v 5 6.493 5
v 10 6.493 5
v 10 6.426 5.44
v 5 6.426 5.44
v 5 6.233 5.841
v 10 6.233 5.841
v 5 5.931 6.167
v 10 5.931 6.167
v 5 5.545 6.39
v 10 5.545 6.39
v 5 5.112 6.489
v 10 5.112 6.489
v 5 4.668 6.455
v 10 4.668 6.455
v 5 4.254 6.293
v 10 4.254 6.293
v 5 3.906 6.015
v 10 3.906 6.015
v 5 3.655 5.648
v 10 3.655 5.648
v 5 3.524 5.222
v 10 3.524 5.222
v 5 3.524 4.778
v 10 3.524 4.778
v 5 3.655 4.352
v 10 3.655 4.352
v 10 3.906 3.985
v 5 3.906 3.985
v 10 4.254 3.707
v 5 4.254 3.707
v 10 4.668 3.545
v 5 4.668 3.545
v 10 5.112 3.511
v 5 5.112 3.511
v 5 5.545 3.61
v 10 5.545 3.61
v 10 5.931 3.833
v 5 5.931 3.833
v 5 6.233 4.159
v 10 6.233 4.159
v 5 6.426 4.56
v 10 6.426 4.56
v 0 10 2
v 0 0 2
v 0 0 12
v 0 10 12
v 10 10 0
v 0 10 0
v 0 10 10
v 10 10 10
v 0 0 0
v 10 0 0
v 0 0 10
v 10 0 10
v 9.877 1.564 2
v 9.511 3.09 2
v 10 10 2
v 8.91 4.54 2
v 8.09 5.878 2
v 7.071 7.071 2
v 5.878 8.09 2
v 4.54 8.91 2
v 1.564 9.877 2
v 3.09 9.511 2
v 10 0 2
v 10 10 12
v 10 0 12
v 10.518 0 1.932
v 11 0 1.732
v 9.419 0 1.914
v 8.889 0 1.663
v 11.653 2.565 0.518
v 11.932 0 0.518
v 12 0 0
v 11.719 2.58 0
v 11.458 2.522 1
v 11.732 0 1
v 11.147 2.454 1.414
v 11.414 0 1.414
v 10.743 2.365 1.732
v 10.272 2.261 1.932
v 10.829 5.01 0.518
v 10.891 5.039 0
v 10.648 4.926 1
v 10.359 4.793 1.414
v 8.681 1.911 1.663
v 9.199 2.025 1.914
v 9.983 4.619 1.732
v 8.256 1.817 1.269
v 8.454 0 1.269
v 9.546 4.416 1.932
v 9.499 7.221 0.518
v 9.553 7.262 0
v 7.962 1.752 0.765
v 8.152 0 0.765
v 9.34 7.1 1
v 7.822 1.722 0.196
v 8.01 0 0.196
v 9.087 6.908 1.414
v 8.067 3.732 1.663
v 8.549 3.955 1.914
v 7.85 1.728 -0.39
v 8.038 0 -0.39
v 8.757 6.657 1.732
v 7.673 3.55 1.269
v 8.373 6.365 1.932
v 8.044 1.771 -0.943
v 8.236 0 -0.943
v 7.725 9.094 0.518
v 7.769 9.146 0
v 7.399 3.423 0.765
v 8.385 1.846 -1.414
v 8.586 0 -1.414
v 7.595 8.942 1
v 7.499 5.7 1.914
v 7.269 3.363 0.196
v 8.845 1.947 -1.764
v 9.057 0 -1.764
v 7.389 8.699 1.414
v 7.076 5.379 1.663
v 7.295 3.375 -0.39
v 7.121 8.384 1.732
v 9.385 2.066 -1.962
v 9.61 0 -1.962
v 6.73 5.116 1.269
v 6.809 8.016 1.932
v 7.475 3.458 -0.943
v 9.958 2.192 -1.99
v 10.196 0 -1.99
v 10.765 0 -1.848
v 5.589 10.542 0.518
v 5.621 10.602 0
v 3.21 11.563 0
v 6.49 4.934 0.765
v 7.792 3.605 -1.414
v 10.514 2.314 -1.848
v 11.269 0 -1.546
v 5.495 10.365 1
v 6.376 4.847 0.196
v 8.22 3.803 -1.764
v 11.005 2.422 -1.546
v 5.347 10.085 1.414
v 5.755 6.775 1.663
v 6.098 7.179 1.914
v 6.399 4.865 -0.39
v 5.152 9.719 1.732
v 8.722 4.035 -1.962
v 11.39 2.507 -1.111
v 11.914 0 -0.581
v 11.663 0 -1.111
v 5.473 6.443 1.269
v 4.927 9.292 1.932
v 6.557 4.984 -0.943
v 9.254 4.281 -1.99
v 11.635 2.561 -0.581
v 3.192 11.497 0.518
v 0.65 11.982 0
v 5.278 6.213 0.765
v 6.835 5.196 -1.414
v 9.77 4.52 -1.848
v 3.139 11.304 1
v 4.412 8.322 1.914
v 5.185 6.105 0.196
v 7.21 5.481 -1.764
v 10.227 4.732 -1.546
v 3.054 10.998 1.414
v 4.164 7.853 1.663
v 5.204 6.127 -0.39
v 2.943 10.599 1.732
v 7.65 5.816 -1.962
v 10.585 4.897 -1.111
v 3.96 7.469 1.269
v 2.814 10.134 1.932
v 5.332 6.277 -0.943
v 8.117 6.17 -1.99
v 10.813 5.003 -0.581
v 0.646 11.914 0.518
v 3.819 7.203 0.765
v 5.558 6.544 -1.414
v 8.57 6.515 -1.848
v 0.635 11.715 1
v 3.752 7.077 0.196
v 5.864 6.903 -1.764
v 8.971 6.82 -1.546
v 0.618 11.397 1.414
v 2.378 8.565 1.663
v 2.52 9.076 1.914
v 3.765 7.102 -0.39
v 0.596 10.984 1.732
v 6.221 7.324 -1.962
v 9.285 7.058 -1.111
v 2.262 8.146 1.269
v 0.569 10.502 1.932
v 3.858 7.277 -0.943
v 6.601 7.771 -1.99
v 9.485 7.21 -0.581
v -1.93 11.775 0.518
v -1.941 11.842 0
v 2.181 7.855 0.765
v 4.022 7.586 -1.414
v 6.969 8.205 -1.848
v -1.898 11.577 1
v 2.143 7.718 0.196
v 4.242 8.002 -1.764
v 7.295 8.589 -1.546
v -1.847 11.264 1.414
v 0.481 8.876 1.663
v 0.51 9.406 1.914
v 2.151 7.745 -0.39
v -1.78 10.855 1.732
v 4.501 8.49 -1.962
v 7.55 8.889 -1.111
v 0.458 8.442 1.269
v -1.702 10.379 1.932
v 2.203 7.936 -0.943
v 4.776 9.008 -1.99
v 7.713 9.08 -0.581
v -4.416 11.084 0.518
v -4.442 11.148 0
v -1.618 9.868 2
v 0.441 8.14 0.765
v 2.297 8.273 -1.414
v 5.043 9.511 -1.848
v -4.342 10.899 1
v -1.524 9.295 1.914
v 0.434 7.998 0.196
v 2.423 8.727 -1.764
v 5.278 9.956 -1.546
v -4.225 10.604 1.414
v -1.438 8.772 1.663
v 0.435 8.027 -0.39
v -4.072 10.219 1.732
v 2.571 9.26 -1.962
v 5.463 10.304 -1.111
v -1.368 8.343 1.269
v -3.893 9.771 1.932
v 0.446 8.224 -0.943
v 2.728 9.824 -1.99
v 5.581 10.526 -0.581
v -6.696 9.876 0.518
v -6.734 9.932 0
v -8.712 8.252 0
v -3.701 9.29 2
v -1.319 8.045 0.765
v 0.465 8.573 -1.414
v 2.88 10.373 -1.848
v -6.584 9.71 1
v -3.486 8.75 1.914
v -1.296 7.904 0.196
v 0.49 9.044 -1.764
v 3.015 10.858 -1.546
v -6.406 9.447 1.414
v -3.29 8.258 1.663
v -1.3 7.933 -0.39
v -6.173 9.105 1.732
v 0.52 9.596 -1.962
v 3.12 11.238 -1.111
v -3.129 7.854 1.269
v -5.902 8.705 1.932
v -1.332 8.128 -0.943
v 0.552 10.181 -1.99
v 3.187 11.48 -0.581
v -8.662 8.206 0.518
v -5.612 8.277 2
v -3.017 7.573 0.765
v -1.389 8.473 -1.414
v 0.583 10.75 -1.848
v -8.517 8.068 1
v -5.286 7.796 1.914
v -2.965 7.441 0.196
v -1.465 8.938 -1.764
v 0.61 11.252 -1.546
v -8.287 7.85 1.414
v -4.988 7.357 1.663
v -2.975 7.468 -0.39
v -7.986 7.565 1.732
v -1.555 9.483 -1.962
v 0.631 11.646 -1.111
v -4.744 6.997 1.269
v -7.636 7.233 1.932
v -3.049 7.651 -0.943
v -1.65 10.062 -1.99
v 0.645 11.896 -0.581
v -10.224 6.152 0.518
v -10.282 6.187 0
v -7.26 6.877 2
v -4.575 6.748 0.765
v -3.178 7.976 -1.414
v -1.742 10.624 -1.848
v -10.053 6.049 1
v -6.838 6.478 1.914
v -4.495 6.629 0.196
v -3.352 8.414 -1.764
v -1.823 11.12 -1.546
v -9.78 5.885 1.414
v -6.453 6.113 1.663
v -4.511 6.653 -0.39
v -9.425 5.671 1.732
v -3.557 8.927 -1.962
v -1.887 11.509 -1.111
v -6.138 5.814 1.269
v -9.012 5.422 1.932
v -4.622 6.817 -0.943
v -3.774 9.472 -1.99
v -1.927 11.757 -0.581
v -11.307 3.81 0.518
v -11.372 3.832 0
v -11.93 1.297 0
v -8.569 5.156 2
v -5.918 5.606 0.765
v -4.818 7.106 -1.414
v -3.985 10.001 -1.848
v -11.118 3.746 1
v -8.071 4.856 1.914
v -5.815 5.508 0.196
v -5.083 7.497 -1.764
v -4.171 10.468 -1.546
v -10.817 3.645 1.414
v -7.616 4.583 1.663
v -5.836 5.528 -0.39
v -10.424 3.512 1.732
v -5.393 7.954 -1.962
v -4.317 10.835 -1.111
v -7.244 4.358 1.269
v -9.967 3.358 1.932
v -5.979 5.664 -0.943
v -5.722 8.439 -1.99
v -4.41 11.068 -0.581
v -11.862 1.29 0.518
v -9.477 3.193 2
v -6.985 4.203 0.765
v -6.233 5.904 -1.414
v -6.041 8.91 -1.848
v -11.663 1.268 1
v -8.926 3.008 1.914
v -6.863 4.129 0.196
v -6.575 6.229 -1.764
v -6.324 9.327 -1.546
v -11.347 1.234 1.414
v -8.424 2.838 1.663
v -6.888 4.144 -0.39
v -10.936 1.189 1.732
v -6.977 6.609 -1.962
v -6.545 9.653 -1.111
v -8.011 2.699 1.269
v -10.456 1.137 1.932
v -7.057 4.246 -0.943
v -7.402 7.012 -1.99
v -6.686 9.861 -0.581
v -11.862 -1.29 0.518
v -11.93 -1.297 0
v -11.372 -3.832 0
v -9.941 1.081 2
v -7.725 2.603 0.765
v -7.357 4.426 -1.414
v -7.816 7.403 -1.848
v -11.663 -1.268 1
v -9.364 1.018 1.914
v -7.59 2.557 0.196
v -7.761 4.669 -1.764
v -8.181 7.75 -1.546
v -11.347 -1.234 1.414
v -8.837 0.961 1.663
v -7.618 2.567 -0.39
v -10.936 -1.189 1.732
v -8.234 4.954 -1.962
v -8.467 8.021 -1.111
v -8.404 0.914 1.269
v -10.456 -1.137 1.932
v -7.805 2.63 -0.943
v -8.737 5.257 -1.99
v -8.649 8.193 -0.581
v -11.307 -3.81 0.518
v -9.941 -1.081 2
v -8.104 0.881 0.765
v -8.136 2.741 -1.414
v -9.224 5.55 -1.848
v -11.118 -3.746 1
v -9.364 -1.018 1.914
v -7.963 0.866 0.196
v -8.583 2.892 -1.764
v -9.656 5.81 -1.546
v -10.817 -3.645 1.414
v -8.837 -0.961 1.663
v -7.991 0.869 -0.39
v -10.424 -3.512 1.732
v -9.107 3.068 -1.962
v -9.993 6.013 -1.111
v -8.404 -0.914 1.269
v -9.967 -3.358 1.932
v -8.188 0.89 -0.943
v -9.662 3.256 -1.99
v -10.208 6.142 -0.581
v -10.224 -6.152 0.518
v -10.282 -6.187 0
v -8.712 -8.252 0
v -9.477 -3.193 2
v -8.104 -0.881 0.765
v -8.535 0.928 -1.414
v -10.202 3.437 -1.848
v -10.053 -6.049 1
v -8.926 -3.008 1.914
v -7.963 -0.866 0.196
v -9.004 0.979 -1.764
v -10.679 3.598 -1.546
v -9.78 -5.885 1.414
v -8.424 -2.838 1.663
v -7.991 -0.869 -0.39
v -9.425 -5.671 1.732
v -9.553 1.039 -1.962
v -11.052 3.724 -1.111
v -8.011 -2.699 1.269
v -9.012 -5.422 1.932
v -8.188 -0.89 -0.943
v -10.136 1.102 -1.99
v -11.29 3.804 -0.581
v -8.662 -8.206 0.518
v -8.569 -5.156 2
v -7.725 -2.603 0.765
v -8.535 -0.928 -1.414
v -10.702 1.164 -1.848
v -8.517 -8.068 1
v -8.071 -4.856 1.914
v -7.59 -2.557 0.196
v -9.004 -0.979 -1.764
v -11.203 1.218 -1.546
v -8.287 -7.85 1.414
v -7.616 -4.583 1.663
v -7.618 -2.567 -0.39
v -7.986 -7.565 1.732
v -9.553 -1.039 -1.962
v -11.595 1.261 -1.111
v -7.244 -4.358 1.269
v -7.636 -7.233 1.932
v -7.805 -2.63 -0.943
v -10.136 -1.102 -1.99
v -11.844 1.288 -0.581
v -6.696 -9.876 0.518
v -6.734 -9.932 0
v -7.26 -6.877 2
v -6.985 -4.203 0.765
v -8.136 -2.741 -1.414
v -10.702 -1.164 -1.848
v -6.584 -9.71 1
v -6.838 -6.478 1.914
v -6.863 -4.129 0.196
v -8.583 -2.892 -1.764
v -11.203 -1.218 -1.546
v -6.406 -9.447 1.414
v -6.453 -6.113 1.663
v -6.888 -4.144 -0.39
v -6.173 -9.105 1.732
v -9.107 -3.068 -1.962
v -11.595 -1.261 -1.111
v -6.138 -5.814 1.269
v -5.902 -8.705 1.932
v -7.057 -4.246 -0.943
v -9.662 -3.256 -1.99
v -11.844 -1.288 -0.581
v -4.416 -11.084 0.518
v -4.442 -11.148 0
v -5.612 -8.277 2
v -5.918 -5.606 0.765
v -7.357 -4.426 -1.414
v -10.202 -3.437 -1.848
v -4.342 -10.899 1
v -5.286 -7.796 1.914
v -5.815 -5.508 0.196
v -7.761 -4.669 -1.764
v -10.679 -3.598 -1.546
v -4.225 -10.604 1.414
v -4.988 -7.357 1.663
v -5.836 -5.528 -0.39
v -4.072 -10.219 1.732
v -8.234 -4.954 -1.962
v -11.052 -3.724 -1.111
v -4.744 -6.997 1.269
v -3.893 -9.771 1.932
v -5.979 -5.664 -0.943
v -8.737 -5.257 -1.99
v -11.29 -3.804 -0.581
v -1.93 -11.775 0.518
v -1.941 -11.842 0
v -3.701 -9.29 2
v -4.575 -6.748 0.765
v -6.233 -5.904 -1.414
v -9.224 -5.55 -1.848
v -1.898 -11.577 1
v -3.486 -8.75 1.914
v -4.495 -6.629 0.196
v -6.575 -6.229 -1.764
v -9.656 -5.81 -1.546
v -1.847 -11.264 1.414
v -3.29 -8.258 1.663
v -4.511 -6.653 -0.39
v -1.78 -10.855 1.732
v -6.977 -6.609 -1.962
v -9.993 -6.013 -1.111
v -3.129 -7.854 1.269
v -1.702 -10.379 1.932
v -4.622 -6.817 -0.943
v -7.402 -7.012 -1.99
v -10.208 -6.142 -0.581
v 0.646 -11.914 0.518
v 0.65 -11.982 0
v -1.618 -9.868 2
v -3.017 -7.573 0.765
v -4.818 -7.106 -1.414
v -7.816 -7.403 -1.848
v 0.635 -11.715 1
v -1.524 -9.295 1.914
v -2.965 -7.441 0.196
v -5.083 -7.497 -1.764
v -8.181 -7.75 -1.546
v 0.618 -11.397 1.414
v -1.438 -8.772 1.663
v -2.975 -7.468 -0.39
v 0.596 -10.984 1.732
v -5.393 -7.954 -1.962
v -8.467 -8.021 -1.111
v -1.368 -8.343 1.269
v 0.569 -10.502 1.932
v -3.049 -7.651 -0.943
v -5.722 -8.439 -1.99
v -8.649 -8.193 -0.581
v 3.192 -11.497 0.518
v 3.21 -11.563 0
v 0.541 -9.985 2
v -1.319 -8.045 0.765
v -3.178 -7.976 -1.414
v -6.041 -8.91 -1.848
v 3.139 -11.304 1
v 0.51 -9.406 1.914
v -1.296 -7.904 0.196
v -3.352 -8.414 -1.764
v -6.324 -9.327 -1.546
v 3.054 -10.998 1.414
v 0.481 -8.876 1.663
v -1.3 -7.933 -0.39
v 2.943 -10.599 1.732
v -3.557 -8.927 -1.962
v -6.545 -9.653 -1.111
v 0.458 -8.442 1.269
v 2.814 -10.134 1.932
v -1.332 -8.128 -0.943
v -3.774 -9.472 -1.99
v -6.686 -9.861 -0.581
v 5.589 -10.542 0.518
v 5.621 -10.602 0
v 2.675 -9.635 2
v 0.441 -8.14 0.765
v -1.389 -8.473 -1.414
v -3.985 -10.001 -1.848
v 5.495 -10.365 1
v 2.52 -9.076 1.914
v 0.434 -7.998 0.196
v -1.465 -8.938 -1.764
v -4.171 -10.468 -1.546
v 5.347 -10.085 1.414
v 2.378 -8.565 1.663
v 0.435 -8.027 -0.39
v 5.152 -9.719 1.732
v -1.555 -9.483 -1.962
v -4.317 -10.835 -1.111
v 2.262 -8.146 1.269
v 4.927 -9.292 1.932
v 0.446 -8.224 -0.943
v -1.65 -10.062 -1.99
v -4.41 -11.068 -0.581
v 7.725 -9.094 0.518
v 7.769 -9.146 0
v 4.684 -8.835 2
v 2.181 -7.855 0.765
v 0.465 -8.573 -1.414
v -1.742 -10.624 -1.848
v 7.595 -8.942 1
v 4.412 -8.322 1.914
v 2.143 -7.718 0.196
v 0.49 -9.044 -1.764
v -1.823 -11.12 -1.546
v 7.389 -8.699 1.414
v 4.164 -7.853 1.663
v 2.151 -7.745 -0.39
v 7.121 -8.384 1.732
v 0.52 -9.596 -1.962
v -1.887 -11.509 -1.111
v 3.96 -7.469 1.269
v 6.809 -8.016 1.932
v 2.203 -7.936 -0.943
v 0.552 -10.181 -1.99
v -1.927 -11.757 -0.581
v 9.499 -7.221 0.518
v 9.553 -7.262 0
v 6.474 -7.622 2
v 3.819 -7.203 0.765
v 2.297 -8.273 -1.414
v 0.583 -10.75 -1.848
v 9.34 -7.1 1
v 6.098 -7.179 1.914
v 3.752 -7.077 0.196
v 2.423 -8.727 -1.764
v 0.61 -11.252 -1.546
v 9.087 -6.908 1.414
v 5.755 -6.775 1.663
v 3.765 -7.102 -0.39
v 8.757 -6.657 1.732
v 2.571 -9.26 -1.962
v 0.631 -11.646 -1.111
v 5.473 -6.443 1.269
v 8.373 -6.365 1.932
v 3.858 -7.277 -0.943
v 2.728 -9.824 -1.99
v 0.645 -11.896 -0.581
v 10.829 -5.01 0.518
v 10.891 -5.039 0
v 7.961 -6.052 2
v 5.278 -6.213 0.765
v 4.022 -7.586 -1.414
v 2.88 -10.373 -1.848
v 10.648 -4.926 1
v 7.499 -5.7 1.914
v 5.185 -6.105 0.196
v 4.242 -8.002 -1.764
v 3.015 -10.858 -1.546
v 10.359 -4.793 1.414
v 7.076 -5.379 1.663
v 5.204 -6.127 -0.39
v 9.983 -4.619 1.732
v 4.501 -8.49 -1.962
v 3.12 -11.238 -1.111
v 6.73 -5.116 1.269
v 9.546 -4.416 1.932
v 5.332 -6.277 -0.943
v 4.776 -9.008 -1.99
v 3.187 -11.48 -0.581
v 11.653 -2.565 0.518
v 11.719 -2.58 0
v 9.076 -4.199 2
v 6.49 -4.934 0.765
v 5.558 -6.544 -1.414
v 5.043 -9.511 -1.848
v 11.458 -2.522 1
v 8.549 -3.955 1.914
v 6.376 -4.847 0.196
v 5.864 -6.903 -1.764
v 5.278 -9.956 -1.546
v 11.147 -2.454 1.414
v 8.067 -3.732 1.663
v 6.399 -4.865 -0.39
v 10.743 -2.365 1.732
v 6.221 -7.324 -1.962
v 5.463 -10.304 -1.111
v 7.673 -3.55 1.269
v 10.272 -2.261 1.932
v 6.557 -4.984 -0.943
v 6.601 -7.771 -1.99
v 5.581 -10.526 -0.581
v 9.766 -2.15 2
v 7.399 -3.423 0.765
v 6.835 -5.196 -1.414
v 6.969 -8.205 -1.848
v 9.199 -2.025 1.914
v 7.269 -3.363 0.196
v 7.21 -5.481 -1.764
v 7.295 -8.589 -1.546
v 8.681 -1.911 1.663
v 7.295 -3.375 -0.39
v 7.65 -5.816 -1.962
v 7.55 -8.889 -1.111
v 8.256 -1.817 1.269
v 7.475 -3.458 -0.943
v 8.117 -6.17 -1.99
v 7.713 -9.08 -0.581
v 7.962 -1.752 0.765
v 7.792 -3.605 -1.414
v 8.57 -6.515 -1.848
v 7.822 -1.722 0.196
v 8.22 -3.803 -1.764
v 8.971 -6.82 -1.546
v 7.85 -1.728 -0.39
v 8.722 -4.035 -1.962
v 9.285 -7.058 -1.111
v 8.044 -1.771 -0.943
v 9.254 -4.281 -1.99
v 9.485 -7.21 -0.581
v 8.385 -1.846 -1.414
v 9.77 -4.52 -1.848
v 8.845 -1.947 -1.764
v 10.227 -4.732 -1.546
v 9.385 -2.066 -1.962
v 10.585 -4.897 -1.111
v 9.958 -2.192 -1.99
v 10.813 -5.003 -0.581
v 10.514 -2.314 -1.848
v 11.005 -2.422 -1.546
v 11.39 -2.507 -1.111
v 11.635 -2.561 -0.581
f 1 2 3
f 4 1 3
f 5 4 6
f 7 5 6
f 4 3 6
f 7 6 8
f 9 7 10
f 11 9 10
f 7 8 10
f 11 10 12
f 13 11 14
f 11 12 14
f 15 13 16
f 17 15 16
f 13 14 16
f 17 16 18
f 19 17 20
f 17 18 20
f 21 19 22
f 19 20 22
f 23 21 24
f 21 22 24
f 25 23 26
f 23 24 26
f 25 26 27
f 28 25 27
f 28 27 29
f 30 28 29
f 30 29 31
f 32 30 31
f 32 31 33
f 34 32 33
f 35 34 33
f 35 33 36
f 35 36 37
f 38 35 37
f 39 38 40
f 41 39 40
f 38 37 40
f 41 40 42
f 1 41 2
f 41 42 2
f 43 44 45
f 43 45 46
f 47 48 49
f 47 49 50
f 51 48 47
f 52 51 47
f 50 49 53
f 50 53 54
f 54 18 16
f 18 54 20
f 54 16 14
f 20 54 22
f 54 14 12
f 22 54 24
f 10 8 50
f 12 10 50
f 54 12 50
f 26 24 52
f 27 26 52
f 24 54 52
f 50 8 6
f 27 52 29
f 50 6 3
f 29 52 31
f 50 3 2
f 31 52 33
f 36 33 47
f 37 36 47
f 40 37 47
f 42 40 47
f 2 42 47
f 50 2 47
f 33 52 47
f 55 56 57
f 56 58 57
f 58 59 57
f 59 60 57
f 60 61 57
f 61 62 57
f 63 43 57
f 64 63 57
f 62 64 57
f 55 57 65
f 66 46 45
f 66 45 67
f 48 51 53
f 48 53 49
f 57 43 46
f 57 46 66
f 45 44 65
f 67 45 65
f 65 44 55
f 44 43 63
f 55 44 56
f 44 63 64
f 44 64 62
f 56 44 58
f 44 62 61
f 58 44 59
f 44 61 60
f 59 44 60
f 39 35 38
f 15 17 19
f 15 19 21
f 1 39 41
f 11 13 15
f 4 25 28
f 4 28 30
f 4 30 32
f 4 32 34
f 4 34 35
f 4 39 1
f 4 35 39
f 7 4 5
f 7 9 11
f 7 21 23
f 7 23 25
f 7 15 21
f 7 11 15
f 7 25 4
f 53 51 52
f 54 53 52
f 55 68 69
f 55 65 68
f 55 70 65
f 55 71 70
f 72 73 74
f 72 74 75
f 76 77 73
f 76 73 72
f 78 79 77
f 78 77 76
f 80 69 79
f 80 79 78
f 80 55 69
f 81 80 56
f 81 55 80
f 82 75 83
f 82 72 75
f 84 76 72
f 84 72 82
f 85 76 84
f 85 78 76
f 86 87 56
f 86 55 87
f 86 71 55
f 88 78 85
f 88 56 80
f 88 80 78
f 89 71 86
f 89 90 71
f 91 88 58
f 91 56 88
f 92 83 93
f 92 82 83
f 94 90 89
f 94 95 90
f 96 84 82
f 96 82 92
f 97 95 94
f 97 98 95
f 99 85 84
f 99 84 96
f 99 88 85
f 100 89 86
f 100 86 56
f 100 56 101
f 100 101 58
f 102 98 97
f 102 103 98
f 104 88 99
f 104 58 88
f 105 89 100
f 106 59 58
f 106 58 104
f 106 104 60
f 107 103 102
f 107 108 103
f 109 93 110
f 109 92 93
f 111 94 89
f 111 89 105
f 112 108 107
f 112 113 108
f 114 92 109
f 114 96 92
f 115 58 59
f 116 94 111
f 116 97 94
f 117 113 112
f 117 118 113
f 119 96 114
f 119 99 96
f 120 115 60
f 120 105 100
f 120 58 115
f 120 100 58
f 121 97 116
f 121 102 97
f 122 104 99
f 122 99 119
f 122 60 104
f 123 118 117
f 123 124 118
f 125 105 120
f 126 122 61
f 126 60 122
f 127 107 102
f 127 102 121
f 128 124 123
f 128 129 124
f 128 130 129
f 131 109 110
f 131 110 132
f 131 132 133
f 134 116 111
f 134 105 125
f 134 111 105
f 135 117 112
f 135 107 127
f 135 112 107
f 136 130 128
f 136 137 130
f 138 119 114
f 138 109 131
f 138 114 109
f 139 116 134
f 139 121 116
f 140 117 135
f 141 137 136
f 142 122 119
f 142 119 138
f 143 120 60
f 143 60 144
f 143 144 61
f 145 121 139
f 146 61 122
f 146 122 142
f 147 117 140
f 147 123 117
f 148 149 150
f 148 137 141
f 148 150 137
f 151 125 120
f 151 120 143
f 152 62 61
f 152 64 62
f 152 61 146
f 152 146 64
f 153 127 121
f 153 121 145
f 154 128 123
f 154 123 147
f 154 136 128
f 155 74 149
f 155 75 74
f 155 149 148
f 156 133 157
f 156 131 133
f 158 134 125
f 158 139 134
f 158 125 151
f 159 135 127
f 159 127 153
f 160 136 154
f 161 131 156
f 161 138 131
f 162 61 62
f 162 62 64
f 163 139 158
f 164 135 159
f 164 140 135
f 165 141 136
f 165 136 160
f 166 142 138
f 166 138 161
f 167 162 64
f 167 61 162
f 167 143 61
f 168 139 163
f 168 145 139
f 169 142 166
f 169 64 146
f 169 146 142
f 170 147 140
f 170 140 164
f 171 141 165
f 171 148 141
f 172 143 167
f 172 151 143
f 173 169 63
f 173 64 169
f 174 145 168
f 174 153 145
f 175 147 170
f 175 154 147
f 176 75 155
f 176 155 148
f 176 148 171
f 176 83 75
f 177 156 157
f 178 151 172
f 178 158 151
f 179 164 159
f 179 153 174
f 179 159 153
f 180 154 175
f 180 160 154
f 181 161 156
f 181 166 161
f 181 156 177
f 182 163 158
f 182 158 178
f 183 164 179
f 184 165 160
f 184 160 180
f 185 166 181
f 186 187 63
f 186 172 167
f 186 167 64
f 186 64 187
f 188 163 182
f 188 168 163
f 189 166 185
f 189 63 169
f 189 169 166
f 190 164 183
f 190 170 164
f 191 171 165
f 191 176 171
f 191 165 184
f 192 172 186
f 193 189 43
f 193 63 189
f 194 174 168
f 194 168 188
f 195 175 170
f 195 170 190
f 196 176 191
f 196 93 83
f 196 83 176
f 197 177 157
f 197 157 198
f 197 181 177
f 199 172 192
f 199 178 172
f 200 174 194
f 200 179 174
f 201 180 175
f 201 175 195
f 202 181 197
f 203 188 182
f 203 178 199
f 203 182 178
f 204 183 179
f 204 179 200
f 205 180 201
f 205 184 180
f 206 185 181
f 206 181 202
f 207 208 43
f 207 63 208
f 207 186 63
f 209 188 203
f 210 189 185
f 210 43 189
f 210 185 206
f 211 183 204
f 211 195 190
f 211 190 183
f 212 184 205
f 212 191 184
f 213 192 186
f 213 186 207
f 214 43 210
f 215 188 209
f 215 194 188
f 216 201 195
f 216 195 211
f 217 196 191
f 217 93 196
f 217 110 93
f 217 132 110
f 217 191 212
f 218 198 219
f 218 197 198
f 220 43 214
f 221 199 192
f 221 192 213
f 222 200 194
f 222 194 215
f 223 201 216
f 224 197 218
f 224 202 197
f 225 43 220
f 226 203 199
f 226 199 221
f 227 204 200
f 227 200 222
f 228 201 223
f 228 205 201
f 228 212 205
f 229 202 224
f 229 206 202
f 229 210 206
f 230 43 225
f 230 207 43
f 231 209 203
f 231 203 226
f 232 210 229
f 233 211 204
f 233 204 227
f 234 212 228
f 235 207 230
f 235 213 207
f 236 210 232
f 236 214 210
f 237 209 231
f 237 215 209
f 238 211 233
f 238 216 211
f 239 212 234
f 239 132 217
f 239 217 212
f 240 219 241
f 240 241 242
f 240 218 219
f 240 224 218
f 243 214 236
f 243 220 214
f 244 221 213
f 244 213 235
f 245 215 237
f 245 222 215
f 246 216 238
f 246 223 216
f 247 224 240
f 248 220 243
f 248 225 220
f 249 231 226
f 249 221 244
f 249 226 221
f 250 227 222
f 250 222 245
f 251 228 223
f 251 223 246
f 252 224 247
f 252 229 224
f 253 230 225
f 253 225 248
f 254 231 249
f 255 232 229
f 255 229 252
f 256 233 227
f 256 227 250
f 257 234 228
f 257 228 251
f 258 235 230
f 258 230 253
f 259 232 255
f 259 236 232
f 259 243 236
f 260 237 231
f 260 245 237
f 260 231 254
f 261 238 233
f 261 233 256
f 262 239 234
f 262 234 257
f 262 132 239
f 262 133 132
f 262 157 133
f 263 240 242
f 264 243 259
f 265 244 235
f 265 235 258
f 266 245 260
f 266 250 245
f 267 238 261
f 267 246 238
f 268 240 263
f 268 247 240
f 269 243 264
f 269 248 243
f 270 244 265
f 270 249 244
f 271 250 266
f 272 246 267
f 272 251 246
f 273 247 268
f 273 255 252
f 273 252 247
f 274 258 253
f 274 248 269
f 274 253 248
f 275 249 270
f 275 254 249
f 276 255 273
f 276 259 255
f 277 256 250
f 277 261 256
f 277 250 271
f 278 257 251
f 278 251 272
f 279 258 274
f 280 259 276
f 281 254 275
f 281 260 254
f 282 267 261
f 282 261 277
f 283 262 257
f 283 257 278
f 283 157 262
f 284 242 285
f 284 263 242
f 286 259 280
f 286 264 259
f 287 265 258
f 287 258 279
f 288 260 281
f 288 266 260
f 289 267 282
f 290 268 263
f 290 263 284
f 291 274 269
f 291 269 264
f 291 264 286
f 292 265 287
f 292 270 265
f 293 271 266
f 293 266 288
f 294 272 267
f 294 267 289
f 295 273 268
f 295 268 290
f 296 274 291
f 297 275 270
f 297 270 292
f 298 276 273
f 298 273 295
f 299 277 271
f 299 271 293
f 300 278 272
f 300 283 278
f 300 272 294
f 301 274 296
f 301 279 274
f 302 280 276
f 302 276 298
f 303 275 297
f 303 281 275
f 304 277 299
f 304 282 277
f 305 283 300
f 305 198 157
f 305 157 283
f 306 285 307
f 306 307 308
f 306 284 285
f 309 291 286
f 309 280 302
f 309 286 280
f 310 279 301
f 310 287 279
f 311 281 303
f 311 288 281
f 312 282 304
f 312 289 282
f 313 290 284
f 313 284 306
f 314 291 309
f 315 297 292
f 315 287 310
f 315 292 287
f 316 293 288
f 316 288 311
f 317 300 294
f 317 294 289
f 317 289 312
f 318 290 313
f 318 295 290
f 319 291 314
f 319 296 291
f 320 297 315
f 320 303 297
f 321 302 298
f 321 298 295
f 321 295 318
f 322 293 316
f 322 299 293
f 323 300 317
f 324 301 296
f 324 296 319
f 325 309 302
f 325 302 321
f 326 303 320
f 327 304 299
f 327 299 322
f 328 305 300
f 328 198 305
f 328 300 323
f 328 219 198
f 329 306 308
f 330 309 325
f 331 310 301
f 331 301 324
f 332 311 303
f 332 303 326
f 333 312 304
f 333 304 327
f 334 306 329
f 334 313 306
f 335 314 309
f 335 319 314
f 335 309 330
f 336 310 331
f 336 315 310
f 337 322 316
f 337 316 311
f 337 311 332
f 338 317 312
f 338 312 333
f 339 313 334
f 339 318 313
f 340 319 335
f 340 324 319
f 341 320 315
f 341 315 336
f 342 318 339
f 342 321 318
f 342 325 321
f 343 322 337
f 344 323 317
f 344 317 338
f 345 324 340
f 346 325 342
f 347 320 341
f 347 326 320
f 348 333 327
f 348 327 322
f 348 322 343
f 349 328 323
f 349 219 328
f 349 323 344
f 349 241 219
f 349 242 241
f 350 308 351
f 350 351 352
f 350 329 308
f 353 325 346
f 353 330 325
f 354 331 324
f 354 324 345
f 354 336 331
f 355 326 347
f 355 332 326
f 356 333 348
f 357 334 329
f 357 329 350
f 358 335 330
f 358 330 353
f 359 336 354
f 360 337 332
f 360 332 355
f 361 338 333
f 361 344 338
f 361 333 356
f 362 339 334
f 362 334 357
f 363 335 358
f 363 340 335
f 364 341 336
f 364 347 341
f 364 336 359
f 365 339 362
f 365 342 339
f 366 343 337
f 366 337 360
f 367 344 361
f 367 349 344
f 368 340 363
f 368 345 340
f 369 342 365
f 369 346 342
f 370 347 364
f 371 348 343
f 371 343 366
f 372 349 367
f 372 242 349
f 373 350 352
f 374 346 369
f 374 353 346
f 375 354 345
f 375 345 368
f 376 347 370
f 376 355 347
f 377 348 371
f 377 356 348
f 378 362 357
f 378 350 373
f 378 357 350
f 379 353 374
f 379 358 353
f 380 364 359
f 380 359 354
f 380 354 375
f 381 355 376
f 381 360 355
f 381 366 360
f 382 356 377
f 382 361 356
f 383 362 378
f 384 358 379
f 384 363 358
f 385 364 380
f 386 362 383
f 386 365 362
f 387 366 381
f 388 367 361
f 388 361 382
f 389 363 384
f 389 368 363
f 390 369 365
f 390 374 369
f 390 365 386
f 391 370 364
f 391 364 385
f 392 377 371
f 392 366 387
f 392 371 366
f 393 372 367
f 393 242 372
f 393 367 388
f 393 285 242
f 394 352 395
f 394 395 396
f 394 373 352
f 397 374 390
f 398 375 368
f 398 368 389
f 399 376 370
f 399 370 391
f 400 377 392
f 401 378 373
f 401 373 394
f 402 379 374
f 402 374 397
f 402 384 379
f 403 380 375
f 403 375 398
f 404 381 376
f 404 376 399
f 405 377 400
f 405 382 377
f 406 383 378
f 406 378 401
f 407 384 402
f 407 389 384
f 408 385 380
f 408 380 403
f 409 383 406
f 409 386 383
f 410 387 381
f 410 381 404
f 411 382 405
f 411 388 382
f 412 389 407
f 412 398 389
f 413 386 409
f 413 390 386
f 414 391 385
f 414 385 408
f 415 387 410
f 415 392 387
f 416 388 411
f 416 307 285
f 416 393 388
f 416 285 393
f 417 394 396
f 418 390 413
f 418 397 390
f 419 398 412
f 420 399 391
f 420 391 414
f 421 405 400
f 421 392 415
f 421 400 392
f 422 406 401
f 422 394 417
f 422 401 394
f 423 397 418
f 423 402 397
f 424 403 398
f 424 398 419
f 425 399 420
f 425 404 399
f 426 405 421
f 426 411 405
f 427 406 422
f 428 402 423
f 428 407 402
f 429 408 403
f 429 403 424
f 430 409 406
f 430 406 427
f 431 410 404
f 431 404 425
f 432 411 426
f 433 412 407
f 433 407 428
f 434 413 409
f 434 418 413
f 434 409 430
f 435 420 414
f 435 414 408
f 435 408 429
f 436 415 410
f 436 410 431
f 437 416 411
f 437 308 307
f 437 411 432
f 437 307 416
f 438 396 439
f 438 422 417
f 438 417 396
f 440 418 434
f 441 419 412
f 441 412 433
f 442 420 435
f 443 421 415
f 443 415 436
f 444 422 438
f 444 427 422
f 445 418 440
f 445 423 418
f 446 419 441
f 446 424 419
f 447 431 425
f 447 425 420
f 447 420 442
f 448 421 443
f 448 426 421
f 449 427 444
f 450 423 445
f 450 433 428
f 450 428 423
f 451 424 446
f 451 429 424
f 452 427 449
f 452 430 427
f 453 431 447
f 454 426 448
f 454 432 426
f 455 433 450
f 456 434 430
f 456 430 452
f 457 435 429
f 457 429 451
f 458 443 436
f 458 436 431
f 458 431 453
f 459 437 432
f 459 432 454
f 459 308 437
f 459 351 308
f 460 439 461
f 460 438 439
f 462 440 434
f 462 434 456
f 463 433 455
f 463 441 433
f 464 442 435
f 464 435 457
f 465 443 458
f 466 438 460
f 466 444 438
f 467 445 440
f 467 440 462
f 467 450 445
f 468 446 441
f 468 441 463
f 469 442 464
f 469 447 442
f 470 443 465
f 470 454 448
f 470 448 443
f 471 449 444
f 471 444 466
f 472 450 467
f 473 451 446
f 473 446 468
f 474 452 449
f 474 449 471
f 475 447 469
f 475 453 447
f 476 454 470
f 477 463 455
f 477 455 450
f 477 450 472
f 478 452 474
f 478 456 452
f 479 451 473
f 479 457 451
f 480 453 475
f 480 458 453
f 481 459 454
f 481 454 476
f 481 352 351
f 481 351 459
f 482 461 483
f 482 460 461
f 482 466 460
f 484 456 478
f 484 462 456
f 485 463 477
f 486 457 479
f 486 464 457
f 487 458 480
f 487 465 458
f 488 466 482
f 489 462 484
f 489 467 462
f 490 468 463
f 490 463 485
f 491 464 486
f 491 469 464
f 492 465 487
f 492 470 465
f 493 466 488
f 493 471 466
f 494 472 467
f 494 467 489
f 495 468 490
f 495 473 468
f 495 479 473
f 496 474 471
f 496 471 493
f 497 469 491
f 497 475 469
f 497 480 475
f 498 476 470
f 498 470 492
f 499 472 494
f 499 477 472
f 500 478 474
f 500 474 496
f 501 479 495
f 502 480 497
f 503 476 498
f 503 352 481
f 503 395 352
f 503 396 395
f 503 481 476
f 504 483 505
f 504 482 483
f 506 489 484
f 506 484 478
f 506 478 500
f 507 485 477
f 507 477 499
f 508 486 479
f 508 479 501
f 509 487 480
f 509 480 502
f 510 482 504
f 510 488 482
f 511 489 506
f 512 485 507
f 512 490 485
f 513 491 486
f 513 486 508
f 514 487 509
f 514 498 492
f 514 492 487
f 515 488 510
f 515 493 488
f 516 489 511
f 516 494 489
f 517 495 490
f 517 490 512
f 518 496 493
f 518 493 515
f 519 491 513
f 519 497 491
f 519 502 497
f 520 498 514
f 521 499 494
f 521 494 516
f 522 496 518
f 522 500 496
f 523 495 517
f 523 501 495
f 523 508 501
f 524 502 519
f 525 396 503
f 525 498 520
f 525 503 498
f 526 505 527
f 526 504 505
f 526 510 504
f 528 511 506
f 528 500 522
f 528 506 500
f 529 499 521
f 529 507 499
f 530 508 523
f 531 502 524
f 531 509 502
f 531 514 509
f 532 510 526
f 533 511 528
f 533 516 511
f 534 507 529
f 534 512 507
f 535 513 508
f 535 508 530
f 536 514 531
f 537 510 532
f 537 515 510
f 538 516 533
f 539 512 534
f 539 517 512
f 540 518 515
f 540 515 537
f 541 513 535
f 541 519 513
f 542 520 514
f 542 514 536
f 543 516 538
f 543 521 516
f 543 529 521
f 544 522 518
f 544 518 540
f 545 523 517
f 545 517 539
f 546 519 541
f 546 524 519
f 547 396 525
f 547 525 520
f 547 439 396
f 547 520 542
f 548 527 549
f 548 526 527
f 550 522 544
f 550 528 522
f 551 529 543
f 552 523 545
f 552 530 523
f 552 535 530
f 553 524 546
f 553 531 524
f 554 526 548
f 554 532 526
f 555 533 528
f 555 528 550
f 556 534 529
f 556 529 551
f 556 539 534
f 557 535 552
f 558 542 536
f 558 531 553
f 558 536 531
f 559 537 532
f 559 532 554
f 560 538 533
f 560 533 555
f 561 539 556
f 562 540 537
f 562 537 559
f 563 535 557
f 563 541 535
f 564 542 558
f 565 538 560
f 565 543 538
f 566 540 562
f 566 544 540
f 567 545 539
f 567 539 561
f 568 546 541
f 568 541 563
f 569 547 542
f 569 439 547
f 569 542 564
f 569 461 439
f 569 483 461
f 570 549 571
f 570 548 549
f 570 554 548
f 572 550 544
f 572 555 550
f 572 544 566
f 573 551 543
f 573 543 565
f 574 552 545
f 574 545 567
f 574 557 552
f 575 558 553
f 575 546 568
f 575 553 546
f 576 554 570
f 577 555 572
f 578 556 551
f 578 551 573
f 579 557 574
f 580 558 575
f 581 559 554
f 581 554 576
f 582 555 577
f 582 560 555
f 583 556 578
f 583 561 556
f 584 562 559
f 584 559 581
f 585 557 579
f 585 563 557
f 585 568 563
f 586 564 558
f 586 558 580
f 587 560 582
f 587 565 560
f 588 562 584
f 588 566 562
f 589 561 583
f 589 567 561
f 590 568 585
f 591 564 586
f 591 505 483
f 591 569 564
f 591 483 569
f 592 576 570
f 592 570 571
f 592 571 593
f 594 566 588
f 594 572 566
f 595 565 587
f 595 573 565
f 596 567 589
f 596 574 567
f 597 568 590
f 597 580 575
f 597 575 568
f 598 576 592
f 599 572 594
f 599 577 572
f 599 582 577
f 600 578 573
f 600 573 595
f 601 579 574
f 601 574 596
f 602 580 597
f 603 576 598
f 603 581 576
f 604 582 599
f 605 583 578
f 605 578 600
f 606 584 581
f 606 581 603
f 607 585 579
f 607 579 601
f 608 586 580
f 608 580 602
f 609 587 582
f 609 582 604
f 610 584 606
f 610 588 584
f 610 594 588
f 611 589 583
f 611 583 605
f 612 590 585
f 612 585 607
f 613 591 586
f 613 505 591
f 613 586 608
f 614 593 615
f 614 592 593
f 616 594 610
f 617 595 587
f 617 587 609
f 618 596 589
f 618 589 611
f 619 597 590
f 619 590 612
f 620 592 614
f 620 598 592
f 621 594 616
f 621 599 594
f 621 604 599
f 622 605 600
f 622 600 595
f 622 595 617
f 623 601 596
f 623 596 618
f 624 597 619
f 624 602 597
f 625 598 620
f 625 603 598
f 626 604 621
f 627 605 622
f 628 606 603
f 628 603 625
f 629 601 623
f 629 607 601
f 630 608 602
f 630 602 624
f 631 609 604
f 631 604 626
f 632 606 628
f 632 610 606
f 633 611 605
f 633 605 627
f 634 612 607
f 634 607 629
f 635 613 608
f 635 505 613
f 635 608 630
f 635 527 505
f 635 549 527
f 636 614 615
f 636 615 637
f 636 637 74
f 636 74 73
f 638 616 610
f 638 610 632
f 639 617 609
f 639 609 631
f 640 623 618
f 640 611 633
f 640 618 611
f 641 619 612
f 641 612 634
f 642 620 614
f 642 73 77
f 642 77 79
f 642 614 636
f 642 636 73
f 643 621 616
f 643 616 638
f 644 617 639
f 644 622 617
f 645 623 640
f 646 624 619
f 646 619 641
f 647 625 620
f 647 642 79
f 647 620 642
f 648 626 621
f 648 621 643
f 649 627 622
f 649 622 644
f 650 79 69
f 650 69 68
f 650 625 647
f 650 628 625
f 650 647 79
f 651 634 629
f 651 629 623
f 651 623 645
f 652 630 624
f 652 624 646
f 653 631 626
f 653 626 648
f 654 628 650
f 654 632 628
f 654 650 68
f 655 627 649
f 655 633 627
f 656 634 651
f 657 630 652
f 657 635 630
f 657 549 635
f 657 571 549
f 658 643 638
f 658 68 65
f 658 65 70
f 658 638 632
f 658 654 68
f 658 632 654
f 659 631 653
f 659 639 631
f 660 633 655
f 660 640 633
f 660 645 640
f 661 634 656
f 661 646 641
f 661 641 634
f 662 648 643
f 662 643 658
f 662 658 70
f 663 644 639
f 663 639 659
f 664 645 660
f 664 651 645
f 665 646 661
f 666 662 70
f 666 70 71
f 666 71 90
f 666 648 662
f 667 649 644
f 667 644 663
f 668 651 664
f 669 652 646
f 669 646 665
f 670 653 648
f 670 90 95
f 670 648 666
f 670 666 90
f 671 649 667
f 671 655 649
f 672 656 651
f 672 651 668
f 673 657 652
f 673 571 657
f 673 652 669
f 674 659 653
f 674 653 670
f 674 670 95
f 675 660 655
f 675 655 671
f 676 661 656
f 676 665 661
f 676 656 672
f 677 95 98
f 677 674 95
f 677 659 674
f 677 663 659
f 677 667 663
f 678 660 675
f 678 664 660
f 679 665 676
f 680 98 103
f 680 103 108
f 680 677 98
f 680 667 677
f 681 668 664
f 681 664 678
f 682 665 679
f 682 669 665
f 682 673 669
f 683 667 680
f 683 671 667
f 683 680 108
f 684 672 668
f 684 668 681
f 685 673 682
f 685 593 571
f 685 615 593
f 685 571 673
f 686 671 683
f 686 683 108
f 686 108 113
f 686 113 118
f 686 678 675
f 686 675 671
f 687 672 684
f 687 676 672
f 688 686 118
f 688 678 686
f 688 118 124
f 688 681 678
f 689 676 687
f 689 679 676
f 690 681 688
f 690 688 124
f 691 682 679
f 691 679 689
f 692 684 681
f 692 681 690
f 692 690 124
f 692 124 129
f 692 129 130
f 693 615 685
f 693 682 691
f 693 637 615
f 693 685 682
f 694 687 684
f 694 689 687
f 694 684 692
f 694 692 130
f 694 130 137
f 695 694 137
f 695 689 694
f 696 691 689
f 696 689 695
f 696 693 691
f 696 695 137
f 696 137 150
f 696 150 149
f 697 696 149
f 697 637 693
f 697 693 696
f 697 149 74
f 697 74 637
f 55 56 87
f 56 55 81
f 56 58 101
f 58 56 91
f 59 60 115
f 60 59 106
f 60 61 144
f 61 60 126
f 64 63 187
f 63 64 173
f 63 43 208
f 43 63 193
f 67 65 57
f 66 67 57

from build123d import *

# Parameters (mm, degrees)
TORUS_R      = 2
BOX_W        = 10
BOX_H        = 10
BOX_DEPTH    = 10
SKETCH_R     = 1.4927
POCKET_DEPTH = 5


with BuildPart() as torus:
    # Torus → Torus (revolve)
    with BuildSketch(Plane.XZ):
        with Locations((10, 0)):
            Circle(TORUS_R)
    revolve(axis=Axis((0, 0, 0), (0, 0, 1)))


with BuildPart() as cube:
    # Box → Box (new body)
    with BuildSketch(Plane.XY.offset(2)):
        with Locations((5, 5)):
            Rectangle(BOX_W, BOX_H)
    extrude(amount=BOX_DEPTH)


with BuildPart() as fusion:
    # Fusion base: copy of Cube
    add(cube.part)

    # Fusion: union Torus
    add(torus.part)


with BuildPart() as body:
    # Body base: copy of Cube
    add(cube.part)


with BuildPart() as body_1:
    # BaseFeature placement: moved
    add(body.part.moved(Location((0, 0, -2))))

    # Sketch (on Face2 of BaseFeature) → Pocket (cut)
    with BuildSketch(Plane.YZ.offset(10)):
        with Locations((5, 5)):
            Circle(SKETCH_R)
    extrude(amount=-POCKET_DEPTH, mode=Mode.SUBTRACT)


solid = Compound([fusion.part, body_1.part])
